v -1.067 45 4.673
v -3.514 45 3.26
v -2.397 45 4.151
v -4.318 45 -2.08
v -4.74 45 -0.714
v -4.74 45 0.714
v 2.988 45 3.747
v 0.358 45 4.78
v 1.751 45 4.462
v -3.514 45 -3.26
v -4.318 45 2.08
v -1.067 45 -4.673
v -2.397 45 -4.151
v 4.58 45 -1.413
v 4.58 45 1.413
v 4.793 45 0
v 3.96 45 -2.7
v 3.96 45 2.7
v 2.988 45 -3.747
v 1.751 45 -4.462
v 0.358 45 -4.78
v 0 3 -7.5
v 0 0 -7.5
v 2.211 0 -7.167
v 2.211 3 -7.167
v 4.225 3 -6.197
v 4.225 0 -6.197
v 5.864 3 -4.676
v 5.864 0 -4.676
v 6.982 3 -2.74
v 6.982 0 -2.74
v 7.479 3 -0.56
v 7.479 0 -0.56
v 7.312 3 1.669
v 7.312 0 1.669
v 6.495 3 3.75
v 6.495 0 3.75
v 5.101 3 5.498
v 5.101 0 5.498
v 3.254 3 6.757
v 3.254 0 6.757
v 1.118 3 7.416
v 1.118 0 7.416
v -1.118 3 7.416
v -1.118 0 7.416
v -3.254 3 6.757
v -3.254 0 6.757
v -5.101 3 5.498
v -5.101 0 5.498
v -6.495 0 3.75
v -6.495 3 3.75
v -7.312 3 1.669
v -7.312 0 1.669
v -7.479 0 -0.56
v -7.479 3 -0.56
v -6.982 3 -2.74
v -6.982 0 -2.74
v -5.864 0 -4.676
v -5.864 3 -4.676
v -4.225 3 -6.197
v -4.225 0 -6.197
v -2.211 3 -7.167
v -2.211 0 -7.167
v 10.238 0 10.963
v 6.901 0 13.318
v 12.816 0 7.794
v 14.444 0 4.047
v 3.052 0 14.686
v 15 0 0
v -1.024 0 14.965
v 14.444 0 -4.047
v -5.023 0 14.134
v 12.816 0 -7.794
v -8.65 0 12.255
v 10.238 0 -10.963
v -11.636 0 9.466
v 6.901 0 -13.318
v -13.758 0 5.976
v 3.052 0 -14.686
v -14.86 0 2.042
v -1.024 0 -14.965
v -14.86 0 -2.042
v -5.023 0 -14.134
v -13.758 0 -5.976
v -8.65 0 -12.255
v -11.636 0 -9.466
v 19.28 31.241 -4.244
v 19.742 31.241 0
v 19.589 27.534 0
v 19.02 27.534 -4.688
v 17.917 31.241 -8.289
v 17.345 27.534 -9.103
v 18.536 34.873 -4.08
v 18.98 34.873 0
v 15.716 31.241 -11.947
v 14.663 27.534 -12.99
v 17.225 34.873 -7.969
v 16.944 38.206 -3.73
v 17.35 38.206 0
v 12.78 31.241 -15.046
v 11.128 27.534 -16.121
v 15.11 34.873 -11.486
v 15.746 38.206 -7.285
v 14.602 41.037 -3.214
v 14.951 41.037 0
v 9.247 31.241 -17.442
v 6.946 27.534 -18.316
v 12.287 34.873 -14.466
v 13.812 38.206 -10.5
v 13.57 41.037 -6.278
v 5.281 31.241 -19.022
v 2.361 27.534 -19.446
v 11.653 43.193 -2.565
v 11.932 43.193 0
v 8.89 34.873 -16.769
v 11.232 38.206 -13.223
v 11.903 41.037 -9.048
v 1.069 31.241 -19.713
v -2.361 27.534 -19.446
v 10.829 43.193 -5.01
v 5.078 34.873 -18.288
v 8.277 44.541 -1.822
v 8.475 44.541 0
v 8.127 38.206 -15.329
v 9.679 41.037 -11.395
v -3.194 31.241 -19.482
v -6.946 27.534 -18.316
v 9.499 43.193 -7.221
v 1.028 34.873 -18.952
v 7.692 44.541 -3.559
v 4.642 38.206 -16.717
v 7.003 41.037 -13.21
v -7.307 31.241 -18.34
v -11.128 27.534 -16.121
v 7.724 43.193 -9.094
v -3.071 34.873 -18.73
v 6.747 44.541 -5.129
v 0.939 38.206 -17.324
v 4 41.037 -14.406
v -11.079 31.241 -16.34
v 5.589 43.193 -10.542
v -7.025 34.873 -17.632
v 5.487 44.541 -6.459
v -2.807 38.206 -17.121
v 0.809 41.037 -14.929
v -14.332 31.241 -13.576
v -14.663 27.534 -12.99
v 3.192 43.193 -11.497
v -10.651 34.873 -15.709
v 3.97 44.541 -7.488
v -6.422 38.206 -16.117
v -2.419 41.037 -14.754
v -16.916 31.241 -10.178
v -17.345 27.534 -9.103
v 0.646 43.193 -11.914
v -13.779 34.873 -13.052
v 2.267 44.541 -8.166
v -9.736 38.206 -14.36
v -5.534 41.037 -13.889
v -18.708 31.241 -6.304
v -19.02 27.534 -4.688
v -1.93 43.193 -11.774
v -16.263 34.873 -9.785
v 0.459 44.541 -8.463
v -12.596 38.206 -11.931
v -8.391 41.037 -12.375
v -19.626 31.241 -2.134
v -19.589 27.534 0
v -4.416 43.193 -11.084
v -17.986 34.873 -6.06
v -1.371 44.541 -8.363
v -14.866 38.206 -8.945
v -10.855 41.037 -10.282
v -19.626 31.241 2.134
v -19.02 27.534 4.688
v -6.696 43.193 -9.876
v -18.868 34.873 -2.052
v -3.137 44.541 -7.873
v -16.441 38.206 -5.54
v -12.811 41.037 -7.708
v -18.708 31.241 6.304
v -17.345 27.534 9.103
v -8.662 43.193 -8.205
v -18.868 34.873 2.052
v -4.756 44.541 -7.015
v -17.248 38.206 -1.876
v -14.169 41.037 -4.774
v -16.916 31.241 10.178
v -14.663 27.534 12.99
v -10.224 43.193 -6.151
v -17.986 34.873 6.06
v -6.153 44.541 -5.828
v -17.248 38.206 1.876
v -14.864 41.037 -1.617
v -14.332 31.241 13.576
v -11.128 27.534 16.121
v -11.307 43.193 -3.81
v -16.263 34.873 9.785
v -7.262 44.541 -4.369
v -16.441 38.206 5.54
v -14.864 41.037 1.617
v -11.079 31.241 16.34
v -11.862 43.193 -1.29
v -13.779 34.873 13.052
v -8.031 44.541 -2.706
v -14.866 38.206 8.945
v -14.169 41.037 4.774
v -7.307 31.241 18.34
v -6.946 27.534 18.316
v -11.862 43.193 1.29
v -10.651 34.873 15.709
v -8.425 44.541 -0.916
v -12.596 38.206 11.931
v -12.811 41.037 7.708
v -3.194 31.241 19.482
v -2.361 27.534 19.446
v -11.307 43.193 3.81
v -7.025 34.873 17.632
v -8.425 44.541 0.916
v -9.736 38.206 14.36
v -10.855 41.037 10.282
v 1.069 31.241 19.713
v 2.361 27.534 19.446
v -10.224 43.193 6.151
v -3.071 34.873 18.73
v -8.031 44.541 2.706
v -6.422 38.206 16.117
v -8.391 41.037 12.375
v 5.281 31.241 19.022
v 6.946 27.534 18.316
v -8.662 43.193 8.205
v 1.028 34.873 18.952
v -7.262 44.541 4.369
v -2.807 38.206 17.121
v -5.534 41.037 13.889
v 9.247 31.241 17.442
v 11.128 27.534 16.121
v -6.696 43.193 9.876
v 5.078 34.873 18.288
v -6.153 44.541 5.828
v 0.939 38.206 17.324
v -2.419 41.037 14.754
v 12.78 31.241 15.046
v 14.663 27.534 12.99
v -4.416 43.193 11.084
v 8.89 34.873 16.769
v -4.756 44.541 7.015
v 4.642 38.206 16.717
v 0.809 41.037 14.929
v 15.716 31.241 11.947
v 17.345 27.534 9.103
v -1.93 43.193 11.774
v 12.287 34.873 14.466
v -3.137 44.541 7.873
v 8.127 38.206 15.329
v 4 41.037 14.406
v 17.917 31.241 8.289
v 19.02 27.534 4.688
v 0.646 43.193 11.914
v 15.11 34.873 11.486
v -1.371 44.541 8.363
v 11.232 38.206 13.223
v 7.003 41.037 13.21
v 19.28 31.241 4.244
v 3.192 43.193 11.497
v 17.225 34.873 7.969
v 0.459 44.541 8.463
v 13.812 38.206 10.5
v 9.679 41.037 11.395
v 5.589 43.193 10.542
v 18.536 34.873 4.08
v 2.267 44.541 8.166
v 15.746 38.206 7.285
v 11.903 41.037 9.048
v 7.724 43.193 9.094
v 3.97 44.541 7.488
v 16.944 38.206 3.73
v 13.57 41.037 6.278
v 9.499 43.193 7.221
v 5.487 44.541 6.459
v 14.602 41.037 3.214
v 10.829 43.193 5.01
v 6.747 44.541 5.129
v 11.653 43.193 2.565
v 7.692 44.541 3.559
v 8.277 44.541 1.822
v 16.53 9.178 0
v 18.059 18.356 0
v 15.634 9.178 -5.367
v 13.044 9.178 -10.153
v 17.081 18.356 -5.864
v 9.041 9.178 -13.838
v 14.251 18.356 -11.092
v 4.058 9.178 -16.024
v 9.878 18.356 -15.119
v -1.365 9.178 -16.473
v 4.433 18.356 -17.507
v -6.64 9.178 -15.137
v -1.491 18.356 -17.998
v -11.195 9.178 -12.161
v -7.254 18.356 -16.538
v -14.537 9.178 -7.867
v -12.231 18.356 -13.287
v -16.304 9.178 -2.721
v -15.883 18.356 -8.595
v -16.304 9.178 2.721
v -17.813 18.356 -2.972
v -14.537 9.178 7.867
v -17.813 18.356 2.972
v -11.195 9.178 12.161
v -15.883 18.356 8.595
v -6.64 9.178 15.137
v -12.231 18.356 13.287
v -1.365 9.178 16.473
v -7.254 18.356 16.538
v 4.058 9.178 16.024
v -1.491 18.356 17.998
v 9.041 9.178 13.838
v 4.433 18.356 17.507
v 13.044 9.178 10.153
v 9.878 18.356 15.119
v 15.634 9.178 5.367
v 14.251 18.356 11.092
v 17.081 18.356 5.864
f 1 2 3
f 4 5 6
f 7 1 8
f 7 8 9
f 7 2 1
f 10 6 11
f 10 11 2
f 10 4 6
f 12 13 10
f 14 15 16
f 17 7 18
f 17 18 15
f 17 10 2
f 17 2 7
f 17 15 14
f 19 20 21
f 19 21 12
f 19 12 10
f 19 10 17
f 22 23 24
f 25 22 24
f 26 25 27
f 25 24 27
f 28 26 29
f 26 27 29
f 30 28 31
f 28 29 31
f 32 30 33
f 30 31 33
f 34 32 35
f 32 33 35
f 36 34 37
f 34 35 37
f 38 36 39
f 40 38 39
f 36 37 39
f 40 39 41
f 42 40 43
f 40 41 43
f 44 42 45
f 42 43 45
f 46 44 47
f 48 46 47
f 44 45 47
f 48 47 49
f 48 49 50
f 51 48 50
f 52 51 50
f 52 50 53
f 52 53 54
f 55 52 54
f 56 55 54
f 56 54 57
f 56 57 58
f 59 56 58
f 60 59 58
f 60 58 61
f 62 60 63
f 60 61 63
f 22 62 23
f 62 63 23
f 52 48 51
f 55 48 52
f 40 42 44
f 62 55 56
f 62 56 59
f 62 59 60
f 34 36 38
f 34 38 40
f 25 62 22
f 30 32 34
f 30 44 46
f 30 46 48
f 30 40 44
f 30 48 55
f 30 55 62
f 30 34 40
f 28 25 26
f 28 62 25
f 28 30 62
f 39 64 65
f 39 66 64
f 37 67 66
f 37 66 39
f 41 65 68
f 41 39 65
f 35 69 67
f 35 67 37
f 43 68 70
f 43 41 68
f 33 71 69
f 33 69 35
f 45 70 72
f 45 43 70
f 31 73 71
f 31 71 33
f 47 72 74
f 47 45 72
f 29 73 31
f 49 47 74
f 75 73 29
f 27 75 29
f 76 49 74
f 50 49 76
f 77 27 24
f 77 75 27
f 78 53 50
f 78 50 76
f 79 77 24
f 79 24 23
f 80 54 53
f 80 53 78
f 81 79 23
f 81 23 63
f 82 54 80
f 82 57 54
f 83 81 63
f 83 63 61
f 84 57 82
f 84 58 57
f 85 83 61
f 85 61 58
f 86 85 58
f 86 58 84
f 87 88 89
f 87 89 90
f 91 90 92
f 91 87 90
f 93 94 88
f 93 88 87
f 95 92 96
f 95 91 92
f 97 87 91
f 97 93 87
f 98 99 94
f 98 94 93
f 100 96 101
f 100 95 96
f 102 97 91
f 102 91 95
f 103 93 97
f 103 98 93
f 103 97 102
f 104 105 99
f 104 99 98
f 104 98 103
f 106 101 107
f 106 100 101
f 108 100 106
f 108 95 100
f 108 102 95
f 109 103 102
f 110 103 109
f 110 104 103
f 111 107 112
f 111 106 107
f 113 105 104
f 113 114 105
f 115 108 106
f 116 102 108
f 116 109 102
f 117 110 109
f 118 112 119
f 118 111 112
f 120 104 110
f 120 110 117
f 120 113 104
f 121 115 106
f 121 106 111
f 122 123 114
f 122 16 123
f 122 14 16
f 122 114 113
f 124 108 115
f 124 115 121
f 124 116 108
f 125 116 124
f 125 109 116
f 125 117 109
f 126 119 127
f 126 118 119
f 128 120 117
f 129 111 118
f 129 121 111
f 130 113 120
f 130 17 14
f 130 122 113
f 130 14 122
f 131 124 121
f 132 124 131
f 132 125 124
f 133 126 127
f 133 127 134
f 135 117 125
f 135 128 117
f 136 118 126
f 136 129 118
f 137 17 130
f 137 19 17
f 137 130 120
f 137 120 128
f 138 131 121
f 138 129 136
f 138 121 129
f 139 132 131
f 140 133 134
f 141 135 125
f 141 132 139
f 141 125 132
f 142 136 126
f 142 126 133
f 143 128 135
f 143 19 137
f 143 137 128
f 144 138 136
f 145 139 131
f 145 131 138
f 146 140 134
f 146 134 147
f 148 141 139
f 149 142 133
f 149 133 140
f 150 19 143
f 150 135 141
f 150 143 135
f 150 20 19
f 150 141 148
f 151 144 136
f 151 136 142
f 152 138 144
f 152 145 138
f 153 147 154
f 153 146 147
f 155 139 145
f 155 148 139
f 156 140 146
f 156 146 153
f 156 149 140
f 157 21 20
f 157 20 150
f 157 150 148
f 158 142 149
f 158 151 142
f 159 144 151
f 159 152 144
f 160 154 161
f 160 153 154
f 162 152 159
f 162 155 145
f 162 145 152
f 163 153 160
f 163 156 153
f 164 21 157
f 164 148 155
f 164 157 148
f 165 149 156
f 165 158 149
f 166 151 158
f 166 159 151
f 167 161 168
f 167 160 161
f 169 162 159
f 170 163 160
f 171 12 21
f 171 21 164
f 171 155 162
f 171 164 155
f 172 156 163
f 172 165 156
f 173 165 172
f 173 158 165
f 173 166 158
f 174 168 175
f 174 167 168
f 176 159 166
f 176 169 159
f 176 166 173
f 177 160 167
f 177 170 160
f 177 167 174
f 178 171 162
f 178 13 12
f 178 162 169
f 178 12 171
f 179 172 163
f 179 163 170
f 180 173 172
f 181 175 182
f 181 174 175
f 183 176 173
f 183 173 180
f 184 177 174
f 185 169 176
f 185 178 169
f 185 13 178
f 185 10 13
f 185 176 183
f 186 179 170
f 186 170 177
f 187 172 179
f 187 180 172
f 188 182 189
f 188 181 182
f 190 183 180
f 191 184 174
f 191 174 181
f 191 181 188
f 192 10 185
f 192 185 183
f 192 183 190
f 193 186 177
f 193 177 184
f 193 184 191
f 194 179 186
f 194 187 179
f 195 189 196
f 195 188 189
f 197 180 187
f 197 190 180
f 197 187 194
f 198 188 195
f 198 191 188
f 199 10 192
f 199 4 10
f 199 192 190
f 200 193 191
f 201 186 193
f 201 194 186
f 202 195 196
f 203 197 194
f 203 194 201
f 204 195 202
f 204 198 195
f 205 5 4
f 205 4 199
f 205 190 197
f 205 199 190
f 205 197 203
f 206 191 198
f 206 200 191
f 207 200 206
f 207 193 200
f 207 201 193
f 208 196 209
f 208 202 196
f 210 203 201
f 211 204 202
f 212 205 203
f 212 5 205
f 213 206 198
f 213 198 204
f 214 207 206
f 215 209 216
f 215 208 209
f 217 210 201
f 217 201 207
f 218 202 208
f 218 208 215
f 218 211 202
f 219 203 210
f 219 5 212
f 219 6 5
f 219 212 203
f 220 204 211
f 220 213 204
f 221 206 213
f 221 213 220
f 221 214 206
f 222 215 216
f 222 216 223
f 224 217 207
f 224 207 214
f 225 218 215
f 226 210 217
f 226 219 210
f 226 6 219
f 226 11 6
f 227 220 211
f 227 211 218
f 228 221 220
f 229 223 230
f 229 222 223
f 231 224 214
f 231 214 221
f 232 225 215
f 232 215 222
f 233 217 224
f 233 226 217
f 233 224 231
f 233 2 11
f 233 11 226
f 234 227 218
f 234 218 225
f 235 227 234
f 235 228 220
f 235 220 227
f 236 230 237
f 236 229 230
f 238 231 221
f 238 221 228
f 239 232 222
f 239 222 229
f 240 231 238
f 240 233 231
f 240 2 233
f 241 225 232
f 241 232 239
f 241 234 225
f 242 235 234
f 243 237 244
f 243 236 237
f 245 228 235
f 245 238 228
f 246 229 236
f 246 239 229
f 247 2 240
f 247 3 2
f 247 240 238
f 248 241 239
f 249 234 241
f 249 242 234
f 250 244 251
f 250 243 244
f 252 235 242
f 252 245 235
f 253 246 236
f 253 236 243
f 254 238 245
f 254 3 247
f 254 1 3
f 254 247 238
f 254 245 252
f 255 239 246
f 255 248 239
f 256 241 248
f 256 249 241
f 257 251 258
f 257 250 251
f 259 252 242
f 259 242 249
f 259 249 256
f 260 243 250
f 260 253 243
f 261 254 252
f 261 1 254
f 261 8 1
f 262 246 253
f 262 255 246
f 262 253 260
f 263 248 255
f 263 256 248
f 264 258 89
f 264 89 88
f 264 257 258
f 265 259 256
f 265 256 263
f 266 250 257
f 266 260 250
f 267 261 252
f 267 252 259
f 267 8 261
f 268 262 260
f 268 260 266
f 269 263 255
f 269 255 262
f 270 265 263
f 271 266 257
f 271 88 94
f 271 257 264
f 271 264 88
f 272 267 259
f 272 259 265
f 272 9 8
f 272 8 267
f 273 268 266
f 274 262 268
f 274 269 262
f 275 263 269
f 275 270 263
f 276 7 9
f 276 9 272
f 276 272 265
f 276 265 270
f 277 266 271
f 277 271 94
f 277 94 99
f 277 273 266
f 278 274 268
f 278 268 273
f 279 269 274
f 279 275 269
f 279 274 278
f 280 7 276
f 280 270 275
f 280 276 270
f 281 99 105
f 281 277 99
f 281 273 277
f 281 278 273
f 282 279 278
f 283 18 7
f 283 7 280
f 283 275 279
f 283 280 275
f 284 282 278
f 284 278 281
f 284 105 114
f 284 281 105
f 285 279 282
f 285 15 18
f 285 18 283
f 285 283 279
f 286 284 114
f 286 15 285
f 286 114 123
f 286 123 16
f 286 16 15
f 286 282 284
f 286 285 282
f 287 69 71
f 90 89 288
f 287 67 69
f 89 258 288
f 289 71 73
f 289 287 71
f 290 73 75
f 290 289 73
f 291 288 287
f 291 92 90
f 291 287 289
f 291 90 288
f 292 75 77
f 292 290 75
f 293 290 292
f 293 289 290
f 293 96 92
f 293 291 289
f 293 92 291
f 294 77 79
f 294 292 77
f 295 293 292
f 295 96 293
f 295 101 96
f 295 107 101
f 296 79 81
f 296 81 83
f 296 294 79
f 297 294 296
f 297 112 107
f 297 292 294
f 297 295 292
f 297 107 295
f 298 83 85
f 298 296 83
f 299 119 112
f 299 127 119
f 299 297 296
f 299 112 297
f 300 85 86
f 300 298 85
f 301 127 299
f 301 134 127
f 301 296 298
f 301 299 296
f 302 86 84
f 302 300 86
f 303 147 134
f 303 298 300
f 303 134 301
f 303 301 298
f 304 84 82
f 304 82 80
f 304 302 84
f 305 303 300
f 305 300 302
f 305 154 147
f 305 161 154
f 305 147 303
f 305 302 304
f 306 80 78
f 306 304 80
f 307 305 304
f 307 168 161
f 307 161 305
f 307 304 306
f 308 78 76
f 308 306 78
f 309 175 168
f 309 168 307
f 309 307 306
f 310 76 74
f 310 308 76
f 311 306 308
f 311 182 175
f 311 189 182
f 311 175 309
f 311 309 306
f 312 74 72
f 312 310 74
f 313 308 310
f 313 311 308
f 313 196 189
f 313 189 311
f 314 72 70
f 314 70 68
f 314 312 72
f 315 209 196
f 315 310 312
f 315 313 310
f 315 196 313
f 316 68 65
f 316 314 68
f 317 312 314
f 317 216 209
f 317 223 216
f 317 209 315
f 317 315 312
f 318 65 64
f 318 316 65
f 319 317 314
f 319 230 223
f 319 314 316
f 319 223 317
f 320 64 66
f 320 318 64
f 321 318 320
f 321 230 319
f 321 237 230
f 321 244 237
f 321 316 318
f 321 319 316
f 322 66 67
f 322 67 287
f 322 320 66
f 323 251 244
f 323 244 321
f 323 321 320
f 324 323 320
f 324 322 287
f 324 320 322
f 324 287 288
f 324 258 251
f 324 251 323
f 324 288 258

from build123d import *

# Parameters (mm, degrees)
SKETCH3_R          = 2.5
CUT_EXTRUDE1_DEPTH = 1
FILLET1_R          = 5
SCALE1_SCALE       = 3


# Read off the part's stored shape, not the designer's step: Boundary1
with BuildPart() as part:
    # Boundary1 outline → Boundary1 (revolve)
    with BuildSketch(Plane.XY):
        Polygon((0, 0), (5, 0), (7.5, 15), (0, 15), align=None)
    revolve(axis=Axis((0, 0, 0), (0, 1, 0)))

    # Sketch3 → Cut-Extrude1 (cut)
    with BuildSketch(Plane.XZ):
        with Locations(Location((0, 0, 0), (0, 0, 270))):
            Circle(SKETCH3_R)
    extrude(amount=-CUT_EXTRUDE1_DEPTH, mode=Mode.SUBTRACT)

    # Fillet1
    fillet1_edges = [part.edges().sort_by_distance(p)[0] for p in [
        (-7.5, 15, 0),
    ]]
    fillet(fillet1_edges, radius=FILLET1_R)


with BuildPart() as part_1:
    # Scale1: scaled about (0, 0, 0)
    add(part.part.scale(SCALE1_SCALE))


solid = part_1.part
